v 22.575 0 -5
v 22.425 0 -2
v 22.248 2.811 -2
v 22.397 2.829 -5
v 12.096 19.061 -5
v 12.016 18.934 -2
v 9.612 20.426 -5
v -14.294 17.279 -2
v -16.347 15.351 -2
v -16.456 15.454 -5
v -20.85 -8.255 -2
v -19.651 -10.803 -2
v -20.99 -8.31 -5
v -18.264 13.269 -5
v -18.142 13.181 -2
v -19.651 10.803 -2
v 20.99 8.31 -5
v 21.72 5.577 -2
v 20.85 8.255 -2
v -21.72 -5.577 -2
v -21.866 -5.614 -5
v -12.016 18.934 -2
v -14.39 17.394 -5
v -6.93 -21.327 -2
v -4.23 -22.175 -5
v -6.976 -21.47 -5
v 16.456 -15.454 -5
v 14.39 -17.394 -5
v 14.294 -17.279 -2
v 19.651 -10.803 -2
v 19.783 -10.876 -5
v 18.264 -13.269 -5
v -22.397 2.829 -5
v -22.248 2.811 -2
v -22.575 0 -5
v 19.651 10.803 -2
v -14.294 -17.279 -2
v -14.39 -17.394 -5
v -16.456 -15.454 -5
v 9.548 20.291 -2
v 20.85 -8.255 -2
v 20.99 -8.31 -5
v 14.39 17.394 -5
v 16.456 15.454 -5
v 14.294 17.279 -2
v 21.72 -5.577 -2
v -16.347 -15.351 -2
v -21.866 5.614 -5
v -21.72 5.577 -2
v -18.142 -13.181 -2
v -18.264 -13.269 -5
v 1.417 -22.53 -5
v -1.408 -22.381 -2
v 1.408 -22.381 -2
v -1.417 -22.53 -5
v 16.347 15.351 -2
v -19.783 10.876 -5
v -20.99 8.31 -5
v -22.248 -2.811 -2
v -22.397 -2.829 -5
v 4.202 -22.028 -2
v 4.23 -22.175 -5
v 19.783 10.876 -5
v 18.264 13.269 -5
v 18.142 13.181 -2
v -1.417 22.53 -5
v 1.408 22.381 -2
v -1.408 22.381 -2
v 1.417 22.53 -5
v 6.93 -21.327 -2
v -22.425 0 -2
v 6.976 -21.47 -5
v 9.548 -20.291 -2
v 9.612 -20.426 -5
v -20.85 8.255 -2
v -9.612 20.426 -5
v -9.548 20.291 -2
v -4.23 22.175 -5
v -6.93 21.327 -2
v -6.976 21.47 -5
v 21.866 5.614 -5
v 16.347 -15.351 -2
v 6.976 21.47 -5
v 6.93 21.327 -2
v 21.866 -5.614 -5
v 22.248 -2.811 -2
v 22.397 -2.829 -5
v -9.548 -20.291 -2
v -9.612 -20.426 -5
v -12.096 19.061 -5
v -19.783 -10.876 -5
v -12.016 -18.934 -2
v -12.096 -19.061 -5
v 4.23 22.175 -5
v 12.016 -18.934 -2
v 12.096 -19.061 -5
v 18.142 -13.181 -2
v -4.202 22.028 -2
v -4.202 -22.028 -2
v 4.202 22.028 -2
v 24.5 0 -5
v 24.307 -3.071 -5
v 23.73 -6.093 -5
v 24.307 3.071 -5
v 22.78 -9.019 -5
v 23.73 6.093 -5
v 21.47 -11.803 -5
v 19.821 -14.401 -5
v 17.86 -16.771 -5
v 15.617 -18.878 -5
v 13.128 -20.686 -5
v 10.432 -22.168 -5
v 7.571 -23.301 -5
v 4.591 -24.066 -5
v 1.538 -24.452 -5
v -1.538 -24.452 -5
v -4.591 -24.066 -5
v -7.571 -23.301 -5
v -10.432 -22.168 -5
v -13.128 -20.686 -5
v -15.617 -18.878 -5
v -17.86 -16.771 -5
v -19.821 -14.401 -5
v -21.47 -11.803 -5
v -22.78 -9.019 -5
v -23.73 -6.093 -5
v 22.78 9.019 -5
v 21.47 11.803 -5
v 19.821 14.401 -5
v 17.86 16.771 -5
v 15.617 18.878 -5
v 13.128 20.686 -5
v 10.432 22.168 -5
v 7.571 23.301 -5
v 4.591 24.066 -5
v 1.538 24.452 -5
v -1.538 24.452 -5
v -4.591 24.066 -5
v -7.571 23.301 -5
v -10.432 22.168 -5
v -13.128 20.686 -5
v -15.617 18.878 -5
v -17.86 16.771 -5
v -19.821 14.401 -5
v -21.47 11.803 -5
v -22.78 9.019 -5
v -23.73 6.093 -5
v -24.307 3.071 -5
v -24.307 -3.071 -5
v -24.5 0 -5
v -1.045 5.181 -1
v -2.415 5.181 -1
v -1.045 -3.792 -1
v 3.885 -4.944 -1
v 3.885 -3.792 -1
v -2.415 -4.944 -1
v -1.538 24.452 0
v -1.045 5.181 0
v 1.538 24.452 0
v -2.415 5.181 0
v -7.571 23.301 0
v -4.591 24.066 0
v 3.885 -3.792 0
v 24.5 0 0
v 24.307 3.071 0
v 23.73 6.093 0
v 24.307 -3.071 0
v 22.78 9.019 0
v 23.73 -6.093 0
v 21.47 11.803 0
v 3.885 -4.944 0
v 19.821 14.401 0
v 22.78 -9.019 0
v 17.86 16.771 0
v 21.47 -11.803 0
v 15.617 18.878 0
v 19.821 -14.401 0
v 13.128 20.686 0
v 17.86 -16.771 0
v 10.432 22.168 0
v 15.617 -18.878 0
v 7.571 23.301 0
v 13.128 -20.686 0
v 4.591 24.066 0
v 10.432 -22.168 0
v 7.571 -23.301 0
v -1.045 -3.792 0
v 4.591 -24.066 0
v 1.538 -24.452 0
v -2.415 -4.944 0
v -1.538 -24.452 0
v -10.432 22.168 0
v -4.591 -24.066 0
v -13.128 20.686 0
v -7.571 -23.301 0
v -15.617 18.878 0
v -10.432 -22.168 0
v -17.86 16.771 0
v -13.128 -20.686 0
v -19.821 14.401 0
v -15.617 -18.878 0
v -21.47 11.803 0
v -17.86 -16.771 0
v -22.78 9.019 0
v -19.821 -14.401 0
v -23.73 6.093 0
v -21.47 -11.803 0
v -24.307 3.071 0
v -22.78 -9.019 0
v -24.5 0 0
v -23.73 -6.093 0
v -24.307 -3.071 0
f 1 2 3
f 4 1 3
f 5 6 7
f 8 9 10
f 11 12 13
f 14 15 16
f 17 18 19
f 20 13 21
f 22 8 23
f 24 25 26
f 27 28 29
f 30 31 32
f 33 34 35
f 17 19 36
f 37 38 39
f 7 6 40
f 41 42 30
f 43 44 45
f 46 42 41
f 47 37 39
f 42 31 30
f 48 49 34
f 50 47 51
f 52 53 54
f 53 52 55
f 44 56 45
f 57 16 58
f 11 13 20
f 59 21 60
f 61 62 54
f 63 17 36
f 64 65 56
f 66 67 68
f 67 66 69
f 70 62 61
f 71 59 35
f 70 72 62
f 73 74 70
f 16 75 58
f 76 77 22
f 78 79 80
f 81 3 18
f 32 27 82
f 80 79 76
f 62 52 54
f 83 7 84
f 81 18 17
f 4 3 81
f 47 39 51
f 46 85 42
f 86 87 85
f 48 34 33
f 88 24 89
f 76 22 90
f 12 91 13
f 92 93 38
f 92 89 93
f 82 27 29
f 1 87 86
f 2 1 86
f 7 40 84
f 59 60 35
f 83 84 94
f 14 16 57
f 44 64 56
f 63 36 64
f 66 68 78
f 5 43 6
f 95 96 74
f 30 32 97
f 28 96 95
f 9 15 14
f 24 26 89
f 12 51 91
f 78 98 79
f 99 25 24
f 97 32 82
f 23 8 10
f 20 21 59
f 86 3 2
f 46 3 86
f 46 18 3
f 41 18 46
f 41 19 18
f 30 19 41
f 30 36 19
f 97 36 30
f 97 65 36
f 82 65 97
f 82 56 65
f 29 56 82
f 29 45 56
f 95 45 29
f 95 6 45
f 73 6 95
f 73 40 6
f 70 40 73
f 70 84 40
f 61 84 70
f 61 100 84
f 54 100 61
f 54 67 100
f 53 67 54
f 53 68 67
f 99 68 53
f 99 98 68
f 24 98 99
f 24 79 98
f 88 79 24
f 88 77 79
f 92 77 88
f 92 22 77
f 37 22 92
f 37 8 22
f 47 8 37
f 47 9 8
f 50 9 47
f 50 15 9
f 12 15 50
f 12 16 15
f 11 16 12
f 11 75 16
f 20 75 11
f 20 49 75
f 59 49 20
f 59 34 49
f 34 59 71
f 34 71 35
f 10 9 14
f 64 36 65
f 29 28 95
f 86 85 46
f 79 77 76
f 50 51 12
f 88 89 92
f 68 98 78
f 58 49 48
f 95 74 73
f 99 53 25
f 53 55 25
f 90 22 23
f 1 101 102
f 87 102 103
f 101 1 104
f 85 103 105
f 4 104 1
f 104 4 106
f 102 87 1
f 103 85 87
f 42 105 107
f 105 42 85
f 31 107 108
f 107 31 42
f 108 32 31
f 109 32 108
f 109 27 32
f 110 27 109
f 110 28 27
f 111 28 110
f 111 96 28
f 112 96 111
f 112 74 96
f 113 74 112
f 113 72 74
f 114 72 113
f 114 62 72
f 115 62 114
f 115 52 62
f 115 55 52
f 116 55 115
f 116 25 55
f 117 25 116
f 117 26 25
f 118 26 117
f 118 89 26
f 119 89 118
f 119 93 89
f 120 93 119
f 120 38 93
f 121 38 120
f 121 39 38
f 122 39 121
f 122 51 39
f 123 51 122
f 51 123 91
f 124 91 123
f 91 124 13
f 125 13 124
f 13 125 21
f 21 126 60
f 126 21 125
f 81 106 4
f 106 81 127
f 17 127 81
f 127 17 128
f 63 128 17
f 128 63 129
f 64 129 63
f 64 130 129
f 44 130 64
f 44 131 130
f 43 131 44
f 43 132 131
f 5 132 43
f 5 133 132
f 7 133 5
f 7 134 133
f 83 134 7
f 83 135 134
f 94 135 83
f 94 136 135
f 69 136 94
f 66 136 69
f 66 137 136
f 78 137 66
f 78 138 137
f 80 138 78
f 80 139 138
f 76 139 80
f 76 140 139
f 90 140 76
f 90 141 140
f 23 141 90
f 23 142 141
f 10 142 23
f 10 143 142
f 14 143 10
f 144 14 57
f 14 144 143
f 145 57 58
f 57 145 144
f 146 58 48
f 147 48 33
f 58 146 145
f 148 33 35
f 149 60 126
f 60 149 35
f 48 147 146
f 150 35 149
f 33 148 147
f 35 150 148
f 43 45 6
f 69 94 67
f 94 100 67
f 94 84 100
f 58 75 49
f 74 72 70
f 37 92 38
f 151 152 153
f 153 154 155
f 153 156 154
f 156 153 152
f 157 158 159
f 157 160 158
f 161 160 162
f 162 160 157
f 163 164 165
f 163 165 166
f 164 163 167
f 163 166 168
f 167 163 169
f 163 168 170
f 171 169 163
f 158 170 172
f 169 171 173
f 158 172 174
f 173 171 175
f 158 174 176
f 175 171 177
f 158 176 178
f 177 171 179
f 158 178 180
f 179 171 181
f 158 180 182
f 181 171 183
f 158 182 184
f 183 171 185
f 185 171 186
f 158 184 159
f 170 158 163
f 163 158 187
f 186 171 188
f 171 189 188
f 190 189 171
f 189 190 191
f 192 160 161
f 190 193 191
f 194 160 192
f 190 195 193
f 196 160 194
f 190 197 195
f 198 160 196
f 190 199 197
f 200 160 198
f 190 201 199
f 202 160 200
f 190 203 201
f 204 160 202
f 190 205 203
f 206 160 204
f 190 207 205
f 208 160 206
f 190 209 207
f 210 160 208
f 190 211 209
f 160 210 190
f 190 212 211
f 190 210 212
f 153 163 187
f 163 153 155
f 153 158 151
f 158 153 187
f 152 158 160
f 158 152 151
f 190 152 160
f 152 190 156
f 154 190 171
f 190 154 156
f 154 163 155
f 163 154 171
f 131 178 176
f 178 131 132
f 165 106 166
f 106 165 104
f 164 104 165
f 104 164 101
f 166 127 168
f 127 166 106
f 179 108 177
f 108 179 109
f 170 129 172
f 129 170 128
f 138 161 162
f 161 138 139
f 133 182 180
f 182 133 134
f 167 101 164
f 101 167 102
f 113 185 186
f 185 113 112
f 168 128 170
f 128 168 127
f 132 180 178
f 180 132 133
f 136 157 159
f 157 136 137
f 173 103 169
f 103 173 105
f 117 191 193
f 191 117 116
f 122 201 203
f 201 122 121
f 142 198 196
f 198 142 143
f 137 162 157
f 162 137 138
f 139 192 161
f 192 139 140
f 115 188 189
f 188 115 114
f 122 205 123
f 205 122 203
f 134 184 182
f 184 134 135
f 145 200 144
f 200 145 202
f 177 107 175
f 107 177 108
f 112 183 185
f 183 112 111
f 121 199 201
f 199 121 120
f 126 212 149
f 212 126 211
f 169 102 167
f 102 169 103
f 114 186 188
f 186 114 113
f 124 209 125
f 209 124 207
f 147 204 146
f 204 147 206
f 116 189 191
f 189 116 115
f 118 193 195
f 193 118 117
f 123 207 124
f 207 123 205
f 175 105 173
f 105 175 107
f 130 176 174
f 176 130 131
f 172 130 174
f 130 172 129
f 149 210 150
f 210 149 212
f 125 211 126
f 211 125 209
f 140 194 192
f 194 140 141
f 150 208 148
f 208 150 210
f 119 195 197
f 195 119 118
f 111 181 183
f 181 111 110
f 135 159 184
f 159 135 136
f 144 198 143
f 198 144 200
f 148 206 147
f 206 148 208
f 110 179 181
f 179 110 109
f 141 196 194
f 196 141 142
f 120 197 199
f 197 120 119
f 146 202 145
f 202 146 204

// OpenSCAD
$fn = 50;

difference() {
	union() {
		translate(v = [0, 0, -5.0]) {
			cylinder(h = 5, r = 24.5);
		}
	}
	union() {
		#translate(v = [0, 0, -5.0]) {
			cylinder(h = 3, r1 = 22.575, r2 = 22.425);
		}
		translate(v = [0, 0, -1]) {
			linear_extrude(height = 1) {
				text(font = "Impact", halign = "center", size = 10, text = "L", valign = "center");
			}
		}
	}
}
